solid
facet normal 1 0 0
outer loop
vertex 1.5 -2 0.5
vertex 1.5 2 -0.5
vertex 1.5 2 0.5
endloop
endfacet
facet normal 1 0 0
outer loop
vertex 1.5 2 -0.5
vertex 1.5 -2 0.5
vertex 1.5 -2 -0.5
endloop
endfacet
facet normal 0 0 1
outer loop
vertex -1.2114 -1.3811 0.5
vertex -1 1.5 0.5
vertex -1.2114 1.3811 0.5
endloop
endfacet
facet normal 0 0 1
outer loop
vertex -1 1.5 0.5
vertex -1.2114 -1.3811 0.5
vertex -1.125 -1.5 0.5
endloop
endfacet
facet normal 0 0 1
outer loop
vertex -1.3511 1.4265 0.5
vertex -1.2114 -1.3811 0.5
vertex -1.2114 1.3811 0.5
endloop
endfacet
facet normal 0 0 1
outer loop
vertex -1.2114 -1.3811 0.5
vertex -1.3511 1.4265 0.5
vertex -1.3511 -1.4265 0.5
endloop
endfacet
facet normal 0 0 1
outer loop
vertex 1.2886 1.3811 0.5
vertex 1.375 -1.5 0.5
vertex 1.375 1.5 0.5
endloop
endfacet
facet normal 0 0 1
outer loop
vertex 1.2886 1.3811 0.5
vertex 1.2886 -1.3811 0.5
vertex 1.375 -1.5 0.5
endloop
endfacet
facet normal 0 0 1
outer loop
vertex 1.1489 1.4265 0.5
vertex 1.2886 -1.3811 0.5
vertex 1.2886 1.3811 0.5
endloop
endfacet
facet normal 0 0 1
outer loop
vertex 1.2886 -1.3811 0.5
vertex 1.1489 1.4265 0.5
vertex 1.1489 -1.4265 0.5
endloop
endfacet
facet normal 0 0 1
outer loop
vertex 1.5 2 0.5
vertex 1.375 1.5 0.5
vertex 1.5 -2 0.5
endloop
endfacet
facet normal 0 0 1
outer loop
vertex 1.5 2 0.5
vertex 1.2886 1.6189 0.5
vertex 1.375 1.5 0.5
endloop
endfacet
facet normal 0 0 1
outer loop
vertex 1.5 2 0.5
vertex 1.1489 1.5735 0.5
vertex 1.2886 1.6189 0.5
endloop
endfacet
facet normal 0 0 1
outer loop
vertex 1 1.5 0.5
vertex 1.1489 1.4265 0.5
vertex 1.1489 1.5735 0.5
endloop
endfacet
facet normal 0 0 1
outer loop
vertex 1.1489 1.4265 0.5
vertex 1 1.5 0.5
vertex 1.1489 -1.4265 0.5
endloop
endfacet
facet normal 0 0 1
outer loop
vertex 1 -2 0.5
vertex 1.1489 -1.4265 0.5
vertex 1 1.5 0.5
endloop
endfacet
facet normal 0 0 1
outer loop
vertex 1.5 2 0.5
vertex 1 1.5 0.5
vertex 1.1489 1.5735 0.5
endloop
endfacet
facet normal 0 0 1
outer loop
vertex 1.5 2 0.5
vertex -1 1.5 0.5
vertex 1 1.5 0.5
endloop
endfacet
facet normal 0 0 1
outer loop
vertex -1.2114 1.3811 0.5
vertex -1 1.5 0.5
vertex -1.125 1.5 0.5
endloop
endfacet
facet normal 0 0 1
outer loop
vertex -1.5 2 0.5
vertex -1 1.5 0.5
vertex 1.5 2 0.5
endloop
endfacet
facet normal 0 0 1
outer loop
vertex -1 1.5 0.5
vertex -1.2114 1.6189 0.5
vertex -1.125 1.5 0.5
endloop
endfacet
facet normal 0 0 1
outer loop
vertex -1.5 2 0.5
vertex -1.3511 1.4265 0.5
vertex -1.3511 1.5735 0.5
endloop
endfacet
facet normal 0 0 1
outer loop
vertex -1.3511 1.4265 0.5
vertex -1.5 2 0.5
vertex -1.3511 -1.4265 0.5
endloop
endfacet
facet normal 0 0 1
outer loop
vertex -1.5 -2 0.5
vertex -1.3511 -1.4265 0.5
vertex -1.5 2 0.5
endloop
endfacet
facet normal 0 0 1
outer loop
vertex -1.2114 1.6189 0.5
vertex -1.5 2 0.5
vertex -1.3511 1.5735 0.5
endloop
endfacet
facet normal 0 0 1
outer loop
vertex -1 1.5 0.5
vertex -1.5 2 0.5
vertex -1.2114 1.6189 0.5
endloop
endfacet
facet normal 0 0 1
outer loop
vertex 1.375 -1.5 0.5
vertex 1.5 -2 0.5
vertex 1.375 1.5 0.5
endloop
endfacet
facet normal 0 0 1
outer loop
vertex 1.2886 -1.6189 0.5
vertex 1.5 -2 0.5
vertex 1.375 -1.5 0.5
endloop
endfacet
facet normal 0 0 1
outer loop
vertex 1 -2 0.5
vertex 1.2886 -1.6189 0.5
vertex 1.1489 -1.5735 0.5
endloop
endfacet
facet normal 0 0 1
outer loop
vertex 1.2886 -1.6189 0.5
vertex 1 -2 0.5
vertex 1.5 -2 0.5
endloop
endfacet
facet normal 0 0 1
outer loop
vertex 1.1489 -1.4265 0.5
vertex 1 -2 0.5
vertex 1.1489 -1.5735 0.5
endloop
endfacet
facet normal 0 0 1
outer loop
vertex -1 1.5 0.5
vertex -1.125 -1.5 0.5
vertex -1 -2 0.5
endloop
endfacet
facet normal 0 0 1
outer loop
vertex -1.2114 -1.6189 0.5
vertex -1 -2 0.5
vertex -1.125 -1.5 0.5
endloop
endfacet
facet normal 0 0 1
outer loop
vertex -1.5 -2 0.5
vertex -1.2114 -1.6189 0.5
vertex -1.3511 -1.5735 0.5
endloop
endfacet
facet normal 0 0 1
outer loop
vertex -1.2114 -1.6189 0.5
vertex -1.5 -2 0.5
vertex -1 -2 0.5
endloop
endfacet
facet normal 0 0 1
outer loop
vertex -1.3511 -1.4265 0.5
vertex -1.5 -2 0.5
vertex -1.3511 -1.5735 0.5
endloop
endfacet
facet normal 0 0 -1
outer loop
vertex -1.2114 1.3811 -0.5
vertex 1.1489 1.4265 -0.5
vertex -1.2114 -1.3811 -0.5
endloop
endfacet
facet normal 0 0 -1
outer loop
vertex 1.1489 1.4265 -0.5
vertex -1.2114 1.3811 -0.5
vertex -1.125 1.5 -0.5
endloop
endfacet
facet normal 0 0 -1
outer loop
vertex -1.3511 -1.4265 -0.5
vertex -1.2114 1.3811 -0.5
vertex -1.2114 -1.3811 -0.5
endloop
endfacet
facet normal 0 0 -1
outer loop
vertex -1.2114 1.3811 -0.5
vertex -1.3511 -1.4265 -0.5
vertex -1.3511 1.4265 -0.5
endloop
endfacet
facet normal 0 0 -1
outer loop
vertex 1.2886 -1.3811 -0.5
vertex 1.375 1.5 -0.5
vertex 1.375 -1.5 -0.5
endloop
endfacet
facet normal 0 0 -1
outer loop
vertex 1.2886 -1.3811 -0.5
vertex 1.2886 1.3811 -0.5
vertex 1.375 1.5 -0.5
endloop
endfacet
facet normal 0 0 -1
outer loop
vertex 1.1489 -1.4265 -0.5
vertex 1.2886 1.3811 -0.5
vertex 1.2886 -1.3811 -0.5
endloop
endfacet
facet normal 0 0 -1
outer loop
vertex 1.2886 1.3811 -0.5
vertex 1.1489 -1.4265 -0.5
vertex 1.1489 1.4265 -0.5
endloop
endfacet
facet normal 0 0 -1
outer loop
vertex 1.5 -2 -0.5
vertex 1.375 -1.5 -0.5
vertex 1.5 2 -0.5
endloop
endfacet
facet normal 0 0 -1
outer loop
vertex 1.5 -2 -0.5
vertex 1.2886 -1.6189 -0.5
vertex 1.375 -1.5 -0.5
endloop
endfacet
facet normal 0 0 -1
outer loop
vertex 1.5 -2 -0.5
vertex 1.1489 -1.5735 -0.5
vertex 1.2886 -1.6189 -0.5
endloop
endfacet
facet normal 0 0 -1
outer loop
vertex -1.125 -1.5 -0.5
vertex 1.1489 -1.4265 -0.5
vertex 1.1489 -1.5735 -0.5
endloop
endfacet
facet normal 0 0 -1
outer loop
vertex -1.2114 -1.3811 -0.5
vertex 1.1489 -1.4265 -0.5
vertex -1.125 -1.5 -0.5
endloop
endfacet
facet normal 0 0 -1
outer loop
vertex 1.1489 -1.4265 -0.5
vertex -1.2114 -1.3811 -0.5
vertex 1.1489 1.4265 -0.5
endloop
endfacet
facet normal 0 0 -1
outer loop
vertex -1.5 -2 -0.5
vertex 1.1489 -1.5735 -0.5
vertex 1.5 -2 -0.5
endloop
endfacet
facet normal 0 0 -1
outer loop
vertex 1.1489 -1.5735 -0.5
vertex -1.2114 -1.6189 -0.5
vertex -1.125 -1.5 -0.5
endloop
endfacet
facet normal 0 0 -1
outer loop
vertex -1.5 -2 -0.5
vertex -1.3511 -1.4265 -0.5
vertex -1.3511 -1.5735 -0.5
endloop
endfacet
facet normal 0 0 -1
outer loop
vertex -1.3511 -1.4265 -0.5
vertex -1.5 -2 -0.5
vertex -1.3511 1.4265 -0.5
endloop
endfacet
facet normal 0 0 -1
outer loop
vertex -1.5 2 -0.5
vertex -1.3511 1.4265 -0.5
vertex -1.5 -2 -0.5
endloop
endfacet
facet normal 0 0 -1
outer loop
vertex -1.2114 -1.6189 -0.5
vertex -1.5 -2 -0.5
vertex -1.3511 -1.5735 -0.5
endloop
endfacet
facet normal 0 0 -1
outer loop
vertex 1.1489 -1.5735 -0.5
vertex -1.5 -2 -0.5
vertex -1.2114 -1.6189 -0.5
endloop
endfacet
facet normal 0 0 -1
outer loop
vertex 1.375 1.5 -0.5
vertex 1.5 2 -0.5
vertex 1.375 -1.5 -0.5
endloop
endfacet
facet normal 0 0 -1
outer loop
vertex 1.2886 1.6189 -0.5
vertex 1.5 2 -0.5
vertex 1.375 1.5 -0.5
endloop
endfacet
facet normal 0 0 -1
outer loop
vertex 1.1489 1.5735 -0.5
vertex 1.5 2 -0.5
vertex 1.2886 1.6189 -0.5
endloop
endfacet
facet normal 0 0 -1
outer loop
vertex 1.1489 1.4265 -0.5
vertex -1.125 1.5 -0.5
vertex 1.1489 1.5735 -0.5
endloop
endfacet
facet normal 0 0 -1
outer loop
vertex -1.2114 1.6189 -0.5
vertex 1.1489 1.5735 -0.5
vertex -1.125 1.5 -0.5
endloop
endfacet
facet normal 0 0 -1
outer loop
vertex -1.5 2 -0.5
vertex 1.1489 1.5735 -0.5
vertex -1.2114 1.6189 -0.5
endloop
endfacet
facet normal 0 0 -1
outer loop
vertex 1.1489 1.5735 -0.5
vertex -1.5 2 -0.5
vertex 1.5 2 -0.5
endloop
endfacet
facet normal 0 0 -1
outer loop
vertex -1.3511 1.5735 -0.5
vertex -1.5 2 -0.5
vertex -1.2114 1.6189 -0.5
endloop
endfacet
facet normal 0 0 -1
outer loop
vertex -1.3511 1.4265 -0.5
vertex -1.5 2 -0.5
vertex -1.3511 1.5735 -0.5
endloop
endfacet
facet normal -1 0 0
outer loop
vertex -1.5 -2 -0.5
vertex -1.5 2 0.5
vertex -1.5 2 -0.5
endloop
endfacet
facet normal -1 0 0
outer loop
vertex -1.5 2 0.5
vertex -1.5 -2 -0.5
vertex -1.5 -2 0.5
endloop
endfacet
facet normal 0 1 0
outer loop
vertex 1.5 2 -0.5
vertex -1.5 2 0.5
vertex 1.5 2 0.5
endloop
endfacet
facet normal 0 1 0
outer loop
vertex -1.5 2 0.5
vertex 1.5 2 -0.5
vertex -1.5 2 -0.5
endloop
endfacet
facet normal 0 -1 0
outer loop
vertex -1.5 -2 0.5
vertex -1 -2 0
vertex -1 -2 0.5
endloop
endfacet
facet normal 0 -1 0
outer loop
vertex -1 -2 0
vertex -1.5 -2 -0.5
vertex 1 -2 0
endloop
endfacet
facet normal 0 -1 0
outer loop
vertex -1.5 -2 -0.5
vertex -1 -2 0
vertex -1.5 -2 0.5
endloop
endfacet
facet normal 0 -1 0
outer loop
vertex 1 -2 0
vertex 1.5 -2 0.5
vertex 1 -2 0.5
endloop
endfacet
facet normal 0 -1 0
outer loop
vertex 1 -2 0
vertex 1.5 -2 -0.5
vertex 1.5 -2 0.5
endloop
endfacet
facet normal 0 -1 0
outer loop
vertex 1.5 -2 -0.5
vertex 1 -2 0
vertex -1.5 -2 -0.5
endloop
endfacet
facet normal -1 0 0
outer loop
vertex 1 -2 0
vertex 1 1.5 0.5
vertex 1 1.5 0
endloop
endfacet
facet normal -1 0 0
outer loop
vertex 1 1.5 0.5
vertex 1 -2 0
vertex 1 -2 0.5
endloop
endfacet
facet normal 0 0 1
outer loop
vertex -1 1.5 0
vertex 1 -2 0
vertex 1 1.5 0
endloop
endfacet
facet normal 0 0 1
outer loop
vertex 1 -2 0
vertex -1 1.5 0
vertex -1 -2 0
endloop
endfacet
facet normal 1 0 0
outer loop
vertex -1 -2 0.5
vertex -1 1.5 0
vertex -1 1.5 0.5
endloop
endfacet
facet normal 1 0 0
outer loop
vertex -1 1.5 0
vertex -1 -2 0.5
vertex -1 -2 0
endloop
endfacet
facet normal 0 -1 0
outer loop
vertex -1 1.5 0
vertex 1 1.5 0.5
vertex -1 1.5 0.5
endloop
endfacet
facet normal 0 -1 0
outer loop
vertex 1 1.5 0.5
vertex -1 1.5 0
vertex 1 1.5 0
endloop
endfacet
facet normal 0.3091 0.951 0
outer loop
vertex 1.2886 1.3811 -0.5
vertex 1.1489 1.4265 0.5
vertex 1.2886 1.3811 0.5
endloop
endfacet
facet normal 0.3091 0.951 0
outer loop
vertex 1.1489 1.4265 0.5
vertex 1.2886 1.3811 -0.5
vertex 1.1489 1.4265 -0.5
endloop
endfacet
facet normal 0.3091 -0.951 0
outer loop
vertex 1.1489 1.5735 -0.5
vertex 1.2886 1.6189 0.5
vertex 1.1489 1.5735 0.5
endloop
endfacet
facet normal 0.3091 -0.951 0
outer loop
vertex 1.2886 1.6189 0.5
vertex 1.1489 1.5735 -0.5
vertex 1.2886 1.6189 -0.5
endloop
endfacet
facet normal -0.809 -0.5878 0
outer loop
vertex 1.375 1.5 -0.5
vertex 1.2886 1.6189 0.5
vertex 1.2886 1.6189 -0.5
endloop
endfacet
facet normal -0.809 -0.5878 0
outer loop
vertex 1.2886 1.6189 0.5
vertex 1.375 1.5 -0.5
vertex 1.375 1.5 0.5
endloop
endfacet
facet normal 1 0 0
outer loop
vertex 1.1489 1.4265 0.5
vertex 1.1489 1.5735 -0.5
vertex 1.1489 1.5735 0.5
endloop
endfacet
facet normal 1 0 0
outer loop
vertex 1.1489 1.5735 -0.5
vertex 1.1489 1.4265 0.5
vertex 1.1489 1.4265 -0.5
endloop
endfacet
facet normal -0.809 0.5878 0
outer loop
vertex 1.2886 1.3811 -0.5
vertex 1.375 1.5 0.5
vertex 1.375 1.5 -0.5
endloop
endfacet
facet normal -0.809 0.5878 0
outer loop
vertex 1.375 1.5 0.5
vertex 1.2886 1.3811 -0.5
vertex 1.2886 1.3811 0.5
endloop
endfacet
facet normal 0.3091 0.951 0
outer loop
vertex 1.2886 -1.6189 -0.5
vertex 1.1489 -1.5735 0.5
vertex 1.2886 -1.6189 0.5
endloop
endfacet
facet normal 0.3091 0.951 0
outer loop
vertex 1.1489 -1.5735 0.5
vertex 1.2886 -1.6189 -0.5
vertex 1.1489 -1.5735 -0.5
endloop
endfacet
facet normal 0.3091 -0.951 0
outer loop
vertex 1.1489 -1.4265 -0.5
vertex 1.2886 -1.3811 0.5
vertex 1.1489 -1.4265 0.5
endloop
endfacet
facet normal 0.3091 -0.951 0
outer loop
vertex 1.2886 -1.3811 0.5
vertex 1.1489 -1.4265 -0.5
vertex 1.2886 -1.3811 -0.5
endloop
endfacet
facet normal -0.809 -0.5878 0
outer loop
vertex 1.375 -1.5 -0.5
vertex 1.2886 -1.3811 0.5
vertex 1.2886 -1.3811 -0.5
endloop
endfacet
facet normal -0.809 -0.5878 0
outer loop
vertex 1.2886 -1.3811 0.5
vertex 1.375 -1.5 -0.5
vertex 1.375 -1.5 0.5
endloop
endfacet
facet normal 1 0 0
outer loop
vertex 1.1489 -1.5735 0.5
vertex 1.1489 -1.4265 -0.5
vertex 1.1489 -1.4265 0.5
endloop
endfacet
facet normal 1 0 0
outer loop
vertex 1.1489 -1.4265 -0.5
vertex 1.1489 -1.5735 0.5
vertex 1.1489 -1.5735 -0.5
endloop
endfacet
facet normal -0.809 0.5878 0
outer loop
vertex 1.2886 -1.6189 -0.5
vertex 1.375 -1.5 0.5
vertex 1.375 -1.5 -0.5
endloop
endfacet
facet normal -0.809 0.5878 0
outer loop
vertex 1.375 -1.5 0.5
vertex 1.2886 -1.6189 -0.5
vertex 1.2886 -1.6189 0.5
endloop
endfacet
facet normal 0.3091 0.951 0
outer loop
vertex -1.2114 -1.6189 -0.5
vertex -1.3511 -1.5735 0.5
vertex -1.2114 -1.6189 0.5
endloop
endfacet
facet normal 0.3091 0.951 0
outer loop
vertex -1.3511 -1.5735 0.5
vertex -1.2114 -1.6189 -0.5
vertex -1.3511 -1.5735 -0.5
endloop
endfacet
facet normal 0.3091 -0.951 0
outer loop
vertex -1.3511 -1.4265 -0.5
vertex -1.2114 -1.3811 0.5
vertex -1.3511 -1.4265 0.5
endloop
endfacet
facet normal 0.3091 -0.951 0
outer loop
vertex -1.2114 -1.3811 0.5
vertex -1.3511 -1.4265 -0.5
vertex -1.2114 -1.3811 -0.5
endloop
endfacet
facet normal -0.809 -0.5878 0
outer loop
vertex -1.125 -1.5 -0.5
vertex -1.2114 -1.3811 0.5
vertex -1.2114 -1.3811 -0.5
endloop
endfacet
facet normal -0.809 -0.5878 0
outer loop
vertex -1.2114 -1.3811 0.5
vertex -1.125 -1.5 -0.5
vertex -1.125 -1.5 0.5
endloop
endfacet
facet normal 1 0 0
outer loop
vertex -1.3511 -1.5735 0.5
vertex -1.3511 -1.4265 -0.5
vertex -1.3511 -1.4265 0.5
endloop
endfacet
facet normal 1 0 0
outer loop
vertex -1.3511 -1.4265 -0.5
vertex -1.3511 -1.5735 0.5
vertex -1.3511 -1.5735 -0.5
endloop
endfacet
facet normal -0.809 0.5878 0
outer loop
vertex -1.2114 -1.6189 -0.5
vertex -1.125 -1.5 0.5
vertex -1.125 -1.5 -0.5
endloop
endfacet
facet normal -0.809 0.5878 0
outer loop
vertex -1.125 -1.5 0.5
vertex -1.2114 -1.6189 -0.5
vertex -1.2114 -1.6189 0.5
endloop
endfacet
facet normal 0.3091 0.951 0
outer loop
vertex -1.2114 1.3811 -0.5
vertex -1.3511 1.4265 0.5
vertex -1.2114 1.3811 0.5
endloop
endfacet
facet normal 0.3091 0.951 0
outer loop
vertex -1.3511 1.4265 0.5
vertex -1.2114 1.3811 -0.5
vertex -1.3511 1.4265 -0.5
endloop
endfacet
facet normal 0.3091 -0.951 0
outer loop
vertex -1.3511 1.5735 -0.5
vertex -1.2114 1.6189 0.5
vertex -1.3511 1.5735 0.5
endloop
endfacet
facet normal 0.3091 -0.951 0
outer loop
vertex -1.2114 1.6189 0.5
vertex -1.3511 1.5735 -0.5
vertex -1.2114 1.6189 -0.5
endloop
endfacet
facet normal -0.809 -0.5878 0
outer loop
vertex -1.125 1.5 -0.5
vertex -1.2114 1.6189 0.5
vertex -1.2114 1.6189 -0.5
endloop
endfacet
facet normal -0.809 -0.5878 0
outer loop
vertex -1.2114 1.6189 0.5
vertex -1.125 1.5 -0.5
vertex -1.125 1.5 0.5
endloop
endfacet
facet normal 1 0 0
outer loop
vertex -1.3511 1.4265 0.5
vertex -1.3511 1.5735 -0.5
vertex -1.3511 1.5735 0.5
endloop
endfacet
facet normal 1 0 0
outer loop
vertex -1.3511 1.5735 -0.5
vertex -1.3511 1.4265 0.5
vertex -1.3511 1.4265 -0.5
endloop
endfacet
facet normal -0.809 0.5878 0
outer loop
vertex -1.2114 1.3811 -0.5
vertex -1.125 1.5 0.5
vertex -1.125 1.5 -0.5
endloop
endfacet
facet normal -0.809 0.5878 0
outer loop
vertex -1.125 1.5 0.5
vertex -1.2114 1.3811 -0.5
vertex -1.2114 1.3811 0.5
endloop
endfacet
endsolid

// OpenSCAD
module screwhole(x,y,z){
    translate([x,y,z]){
        cylinder(h = 4,r=.125,center = true);
    }
}

difference(){
    difference(){
        difference(){
            difference(){
                difference(){
                    cube([3,4,1],center = true);
                    translate([0,-0.5,0.5]){
                        cube([2,4,1],center = true);  
                    }
                }
                screwhole(1.25,1.5,0);
            }
            screwhole(1.25,-1.5,0);
        }
        screwhole(-1.25,-1.5,0);
    }
    
    screwhole(-1.25,1.5,0);
}
